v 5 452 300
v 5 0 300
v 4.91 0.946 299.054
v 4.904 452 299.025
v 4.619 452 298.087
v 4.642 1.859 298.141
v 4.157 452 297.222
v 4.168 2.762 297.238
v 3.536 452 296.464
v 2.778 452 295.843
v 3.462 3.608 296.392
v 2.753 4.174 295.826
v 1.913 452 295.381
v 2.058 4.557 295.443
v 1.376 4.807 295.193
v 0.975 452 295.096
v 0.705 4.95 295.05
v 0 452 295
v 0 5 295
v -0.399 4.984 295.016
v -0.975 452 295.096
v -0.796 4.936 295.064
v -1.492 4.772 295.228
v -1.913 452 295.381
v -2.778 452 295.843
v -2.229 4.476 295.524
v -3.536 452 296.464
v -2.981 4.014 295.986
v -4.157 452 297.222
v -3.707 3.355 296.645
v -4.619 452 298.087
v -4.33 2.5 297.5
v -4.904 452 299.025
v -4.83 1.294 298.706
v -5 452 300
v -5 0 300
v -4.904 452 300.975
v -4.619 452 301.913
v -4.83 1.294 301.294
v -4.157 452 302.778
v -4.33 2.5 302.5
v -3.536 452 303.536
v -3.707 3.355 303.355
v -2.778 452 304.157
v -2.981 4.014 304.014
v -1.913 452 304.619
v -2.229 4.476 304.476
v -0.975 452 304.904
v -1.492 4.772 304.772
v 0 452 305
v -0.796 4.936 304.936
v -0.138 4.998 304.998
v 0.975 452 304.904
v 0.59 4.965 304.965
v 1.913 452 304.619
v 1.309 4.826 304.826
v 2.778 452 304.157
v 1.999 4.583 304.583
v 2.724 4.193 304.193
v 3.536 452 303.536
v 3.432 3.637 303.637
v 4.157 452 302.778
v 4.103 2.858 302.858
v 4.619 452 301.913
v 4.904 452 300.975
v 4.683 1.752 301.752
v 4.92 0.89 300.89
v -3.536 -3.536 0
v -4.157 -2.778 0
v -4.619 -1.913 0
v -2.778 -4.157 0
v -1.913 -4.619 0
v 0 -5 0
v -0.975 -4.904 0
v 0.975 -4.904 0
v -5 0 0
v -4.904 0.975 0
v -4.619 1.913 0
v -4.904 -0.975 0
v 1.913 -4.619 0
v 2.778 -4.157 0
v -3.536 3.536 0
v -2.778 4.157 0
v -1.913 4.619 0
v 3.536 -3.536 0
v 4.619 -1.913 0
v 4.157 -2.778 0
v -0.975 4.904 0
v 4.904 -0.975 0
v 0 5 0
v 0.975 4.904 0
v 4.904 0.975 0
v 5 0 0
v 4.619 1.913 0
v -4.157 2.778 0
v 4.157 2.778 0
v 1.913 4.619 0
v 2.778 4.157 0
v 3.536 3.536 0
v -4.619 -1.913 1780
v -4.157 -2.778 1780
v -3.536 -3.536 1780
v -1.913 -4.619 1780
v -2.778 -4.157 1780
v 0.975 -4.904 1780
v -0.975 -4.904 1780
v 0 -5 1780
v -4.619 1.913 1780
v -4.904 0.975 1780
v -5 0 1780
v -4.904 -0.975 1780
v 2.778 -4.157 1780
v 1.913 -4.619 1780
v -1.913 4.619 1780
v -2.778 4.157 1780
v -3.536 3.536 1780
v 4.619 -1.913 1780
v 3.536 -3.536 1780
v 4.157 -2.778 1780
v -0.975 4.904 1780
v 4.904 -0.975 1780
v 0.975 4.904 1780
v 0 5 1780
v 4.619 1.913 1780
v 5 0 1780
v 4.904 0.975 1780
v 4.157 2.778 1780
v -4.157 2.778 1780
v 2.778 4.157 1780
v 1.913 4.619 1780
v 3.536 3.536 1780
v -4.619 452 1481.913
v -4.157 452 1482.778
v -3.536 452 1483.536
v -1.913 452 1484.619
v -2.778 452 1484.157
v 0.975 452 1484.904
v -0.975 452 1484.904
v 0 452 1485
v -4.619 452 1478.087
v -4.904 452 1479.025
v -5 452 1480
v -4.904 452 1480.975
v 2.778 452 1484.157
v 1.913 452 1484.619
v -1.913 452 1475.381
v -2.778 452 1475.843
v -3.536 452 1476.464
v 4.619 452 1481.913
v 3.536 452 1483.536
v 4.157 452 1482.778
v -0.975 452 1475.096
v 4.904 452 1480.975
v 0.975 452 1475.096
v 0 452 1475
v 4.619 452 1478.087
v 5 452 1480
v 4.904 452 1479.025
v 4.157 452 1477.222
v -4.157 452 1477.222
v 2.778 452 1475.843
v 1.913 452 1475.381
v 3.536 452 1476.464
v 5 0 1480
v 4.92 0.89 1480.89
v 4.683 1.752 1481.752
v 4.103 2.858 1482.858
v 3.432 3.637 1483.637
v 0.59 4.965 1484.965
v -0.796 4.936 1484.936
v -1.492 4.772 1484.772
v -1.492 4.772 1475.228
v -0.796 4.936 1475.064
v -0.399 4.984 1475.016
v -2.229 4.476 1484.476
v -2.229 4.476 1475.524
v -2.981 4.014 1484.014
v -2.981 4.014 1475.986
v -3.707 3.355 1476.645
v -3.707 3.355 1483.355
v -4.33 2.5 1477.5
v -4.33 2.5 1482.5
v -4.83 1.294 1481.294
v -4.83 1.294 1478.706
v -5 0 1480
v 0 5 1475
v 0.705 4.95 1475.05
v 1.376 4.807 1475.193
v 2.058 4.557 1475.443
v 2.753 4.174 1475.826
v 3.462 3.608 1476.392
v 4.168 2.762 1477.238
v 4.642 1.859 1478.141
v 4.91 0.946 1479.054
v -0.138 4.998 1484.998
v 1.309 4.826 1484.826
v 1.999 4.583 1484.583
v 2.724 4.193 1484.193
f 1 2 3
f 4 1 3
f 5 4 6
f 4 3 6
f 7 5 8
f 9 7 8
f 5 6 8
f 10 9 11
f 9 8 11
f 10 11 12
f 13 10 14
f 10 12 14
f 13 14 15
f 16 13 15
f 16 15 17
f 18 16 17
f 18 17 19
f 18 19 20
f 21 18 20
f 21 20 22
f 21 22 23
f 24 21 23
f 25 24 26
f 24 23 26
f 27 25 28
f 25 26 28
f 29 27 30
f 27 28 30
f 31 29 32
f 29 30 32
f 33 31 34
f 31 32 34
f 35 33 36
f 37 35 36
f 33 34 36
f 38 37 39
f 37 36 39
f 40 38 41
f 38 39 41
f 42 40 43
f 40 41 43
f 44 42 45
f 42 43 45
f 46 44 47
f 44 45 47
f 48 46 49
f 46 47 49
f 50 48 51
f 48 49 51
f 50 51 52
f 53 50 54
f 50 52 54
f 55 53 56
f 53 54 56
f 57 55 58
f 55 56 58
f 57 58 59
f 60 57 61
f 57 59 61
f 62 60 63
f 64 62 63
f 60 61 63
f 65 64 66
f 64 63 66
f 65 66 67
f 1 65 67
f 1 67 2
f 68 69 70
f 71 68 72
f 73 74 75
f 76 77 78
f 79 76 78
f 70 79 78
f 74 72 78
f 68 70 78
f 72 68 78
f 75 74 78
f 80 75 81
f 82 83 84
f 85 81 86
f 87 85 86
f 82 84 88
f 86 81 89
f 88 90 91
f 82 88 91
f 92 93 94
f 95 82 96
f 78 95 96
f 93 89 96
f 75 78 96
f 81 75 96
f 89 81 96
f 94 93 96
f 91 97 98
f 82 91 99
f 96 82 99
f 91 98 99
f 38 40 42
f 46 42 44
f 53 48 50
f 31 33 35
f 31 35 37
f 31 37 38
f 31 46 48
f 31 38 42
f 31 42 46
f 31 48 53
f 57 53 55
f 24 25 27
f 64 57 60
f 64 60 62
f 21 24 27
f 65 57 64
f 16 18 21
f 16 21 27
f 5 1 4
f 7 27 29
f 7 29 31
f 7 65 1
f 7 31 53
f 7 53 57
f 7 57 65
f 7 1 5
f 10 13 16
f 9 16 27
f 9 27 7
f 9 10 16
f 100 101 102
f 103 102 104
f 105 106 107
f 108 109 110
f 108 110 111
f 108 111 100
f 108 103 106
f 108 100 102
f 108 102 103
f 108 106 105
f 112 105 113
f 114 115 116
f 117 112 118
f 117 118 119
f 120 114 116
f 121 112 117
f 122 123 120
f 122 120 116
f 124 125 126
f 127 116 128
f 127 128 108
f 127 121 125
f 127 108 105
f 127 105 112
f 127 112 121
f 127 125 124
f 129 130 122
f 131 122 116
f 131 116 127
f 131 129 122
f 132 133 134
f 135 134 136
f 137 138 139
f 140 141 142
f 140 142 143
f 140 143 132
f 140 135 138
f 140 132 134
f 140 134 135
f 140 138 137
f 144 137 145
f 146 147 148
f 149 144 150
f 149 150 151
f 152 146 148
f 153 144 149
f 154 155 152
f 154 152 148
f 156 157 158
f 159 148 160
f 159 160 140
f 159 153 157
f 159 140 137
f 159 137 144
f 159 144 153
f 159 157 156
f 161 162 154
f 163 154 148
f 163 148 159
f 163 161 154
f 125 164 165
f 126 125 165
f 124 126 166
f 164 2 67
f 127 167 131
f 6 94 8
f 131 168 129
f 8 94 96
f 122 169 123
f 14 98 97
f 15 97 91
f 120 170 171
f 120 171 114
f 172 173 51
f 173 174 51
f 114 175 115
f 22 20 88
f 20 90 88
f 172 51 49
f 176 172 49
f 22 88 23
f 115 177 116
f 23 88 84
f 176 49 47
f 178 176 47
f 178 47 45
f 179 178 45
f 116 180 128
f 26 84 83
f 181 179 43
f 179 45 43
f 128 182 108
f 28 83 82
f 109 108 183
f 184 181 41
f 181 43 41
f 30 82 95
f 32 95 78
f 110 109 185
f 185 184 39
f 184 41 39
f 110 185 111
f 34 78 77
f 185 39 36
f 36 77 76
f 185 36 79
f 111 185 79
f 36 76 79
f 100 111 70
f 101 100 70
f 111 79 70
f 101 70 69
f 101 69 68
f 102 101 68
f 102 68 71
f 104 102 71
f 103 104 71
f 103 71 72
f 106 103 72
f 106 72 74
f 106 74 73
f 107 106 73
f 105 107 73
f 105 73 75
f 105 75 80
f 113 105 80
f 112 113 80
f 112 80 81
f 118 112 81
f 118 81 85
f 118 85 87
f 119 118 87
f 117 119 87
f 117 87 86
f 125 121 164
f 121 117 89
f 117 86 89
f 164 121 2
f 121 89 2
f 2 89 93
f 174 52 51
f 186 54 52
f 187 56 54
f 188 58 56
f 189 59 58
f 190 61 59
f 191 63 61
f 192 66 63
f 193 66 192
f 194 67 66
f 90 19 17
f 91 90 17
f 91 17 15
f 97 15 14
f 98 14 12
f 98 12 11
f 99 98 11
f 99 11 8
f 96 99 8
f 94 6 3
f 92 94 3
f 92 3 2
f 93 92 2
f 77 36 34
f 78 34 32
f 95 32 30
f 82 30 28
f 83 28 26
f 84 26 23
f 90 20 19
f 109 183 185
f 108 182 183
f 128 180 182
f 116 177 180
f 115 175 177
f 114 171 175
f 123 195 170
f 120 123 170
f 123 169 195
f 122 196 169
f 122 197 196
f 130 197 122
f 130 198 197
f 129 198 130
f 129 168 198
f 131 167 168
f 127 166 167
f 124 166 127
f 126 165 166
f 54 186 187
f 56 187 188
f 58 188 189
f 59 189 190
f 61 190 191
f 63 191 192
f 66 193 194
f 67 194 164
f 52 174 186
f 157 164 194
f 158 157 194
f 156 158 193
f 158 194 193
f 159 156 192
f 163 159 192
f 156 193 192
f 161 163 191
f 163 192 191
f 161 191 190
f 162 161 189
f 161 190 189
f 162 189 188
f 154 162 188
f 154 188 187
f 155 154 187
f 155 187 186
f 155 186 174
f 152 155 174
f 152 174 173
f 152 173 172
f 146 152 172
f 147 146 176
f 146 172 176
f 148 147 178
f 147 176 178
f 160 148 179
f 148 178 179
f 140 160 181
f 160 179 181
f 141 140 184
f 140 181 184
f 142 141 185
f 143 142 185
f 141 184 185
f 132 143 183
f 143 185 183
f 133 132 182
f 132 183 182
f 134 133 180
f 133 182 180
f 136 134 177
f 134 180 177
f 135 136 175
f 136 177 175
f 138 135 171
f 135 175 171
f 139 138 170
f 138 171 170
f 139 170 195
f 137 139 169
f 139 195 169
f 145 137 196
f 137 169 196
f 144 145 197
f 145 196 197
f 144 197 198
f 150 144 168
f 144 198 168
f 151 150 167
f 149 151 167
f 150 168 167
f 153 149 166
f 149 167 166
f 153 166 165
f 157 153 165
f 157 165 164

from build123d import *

# Parameters (mm, degrees)
SKETCH_1_R      = 5
EXTRUDE_1_DEPTH = 1780
SKETCH_2_R      = 5
EXTRUDE_2_DEPTH = 452


with BuildPart() as part:
    # 草图1 → 凸台-拉伸1 (new body)
    with BuildSketch(Plane.XY):
        Circle(SKETCH_1_R)
    extrude(amount=EXTRUDE_1_DEPTH)

    # 草图2 → 凸台-拉伸2 (add)
    with BuildSketch(Plane(origin=(0, 0, 0), x_dir=(1, 0, 0), z_dir=(0, 1, 0))):
        with Locations((0, -300)):
            Circle(SKETCH_2_R)
        with Locations((0, -1480)):
            Circle(SKETCH_2_R)
    extrude(amount=EXTRUDE_2_DEPTH)


solid = part.part
